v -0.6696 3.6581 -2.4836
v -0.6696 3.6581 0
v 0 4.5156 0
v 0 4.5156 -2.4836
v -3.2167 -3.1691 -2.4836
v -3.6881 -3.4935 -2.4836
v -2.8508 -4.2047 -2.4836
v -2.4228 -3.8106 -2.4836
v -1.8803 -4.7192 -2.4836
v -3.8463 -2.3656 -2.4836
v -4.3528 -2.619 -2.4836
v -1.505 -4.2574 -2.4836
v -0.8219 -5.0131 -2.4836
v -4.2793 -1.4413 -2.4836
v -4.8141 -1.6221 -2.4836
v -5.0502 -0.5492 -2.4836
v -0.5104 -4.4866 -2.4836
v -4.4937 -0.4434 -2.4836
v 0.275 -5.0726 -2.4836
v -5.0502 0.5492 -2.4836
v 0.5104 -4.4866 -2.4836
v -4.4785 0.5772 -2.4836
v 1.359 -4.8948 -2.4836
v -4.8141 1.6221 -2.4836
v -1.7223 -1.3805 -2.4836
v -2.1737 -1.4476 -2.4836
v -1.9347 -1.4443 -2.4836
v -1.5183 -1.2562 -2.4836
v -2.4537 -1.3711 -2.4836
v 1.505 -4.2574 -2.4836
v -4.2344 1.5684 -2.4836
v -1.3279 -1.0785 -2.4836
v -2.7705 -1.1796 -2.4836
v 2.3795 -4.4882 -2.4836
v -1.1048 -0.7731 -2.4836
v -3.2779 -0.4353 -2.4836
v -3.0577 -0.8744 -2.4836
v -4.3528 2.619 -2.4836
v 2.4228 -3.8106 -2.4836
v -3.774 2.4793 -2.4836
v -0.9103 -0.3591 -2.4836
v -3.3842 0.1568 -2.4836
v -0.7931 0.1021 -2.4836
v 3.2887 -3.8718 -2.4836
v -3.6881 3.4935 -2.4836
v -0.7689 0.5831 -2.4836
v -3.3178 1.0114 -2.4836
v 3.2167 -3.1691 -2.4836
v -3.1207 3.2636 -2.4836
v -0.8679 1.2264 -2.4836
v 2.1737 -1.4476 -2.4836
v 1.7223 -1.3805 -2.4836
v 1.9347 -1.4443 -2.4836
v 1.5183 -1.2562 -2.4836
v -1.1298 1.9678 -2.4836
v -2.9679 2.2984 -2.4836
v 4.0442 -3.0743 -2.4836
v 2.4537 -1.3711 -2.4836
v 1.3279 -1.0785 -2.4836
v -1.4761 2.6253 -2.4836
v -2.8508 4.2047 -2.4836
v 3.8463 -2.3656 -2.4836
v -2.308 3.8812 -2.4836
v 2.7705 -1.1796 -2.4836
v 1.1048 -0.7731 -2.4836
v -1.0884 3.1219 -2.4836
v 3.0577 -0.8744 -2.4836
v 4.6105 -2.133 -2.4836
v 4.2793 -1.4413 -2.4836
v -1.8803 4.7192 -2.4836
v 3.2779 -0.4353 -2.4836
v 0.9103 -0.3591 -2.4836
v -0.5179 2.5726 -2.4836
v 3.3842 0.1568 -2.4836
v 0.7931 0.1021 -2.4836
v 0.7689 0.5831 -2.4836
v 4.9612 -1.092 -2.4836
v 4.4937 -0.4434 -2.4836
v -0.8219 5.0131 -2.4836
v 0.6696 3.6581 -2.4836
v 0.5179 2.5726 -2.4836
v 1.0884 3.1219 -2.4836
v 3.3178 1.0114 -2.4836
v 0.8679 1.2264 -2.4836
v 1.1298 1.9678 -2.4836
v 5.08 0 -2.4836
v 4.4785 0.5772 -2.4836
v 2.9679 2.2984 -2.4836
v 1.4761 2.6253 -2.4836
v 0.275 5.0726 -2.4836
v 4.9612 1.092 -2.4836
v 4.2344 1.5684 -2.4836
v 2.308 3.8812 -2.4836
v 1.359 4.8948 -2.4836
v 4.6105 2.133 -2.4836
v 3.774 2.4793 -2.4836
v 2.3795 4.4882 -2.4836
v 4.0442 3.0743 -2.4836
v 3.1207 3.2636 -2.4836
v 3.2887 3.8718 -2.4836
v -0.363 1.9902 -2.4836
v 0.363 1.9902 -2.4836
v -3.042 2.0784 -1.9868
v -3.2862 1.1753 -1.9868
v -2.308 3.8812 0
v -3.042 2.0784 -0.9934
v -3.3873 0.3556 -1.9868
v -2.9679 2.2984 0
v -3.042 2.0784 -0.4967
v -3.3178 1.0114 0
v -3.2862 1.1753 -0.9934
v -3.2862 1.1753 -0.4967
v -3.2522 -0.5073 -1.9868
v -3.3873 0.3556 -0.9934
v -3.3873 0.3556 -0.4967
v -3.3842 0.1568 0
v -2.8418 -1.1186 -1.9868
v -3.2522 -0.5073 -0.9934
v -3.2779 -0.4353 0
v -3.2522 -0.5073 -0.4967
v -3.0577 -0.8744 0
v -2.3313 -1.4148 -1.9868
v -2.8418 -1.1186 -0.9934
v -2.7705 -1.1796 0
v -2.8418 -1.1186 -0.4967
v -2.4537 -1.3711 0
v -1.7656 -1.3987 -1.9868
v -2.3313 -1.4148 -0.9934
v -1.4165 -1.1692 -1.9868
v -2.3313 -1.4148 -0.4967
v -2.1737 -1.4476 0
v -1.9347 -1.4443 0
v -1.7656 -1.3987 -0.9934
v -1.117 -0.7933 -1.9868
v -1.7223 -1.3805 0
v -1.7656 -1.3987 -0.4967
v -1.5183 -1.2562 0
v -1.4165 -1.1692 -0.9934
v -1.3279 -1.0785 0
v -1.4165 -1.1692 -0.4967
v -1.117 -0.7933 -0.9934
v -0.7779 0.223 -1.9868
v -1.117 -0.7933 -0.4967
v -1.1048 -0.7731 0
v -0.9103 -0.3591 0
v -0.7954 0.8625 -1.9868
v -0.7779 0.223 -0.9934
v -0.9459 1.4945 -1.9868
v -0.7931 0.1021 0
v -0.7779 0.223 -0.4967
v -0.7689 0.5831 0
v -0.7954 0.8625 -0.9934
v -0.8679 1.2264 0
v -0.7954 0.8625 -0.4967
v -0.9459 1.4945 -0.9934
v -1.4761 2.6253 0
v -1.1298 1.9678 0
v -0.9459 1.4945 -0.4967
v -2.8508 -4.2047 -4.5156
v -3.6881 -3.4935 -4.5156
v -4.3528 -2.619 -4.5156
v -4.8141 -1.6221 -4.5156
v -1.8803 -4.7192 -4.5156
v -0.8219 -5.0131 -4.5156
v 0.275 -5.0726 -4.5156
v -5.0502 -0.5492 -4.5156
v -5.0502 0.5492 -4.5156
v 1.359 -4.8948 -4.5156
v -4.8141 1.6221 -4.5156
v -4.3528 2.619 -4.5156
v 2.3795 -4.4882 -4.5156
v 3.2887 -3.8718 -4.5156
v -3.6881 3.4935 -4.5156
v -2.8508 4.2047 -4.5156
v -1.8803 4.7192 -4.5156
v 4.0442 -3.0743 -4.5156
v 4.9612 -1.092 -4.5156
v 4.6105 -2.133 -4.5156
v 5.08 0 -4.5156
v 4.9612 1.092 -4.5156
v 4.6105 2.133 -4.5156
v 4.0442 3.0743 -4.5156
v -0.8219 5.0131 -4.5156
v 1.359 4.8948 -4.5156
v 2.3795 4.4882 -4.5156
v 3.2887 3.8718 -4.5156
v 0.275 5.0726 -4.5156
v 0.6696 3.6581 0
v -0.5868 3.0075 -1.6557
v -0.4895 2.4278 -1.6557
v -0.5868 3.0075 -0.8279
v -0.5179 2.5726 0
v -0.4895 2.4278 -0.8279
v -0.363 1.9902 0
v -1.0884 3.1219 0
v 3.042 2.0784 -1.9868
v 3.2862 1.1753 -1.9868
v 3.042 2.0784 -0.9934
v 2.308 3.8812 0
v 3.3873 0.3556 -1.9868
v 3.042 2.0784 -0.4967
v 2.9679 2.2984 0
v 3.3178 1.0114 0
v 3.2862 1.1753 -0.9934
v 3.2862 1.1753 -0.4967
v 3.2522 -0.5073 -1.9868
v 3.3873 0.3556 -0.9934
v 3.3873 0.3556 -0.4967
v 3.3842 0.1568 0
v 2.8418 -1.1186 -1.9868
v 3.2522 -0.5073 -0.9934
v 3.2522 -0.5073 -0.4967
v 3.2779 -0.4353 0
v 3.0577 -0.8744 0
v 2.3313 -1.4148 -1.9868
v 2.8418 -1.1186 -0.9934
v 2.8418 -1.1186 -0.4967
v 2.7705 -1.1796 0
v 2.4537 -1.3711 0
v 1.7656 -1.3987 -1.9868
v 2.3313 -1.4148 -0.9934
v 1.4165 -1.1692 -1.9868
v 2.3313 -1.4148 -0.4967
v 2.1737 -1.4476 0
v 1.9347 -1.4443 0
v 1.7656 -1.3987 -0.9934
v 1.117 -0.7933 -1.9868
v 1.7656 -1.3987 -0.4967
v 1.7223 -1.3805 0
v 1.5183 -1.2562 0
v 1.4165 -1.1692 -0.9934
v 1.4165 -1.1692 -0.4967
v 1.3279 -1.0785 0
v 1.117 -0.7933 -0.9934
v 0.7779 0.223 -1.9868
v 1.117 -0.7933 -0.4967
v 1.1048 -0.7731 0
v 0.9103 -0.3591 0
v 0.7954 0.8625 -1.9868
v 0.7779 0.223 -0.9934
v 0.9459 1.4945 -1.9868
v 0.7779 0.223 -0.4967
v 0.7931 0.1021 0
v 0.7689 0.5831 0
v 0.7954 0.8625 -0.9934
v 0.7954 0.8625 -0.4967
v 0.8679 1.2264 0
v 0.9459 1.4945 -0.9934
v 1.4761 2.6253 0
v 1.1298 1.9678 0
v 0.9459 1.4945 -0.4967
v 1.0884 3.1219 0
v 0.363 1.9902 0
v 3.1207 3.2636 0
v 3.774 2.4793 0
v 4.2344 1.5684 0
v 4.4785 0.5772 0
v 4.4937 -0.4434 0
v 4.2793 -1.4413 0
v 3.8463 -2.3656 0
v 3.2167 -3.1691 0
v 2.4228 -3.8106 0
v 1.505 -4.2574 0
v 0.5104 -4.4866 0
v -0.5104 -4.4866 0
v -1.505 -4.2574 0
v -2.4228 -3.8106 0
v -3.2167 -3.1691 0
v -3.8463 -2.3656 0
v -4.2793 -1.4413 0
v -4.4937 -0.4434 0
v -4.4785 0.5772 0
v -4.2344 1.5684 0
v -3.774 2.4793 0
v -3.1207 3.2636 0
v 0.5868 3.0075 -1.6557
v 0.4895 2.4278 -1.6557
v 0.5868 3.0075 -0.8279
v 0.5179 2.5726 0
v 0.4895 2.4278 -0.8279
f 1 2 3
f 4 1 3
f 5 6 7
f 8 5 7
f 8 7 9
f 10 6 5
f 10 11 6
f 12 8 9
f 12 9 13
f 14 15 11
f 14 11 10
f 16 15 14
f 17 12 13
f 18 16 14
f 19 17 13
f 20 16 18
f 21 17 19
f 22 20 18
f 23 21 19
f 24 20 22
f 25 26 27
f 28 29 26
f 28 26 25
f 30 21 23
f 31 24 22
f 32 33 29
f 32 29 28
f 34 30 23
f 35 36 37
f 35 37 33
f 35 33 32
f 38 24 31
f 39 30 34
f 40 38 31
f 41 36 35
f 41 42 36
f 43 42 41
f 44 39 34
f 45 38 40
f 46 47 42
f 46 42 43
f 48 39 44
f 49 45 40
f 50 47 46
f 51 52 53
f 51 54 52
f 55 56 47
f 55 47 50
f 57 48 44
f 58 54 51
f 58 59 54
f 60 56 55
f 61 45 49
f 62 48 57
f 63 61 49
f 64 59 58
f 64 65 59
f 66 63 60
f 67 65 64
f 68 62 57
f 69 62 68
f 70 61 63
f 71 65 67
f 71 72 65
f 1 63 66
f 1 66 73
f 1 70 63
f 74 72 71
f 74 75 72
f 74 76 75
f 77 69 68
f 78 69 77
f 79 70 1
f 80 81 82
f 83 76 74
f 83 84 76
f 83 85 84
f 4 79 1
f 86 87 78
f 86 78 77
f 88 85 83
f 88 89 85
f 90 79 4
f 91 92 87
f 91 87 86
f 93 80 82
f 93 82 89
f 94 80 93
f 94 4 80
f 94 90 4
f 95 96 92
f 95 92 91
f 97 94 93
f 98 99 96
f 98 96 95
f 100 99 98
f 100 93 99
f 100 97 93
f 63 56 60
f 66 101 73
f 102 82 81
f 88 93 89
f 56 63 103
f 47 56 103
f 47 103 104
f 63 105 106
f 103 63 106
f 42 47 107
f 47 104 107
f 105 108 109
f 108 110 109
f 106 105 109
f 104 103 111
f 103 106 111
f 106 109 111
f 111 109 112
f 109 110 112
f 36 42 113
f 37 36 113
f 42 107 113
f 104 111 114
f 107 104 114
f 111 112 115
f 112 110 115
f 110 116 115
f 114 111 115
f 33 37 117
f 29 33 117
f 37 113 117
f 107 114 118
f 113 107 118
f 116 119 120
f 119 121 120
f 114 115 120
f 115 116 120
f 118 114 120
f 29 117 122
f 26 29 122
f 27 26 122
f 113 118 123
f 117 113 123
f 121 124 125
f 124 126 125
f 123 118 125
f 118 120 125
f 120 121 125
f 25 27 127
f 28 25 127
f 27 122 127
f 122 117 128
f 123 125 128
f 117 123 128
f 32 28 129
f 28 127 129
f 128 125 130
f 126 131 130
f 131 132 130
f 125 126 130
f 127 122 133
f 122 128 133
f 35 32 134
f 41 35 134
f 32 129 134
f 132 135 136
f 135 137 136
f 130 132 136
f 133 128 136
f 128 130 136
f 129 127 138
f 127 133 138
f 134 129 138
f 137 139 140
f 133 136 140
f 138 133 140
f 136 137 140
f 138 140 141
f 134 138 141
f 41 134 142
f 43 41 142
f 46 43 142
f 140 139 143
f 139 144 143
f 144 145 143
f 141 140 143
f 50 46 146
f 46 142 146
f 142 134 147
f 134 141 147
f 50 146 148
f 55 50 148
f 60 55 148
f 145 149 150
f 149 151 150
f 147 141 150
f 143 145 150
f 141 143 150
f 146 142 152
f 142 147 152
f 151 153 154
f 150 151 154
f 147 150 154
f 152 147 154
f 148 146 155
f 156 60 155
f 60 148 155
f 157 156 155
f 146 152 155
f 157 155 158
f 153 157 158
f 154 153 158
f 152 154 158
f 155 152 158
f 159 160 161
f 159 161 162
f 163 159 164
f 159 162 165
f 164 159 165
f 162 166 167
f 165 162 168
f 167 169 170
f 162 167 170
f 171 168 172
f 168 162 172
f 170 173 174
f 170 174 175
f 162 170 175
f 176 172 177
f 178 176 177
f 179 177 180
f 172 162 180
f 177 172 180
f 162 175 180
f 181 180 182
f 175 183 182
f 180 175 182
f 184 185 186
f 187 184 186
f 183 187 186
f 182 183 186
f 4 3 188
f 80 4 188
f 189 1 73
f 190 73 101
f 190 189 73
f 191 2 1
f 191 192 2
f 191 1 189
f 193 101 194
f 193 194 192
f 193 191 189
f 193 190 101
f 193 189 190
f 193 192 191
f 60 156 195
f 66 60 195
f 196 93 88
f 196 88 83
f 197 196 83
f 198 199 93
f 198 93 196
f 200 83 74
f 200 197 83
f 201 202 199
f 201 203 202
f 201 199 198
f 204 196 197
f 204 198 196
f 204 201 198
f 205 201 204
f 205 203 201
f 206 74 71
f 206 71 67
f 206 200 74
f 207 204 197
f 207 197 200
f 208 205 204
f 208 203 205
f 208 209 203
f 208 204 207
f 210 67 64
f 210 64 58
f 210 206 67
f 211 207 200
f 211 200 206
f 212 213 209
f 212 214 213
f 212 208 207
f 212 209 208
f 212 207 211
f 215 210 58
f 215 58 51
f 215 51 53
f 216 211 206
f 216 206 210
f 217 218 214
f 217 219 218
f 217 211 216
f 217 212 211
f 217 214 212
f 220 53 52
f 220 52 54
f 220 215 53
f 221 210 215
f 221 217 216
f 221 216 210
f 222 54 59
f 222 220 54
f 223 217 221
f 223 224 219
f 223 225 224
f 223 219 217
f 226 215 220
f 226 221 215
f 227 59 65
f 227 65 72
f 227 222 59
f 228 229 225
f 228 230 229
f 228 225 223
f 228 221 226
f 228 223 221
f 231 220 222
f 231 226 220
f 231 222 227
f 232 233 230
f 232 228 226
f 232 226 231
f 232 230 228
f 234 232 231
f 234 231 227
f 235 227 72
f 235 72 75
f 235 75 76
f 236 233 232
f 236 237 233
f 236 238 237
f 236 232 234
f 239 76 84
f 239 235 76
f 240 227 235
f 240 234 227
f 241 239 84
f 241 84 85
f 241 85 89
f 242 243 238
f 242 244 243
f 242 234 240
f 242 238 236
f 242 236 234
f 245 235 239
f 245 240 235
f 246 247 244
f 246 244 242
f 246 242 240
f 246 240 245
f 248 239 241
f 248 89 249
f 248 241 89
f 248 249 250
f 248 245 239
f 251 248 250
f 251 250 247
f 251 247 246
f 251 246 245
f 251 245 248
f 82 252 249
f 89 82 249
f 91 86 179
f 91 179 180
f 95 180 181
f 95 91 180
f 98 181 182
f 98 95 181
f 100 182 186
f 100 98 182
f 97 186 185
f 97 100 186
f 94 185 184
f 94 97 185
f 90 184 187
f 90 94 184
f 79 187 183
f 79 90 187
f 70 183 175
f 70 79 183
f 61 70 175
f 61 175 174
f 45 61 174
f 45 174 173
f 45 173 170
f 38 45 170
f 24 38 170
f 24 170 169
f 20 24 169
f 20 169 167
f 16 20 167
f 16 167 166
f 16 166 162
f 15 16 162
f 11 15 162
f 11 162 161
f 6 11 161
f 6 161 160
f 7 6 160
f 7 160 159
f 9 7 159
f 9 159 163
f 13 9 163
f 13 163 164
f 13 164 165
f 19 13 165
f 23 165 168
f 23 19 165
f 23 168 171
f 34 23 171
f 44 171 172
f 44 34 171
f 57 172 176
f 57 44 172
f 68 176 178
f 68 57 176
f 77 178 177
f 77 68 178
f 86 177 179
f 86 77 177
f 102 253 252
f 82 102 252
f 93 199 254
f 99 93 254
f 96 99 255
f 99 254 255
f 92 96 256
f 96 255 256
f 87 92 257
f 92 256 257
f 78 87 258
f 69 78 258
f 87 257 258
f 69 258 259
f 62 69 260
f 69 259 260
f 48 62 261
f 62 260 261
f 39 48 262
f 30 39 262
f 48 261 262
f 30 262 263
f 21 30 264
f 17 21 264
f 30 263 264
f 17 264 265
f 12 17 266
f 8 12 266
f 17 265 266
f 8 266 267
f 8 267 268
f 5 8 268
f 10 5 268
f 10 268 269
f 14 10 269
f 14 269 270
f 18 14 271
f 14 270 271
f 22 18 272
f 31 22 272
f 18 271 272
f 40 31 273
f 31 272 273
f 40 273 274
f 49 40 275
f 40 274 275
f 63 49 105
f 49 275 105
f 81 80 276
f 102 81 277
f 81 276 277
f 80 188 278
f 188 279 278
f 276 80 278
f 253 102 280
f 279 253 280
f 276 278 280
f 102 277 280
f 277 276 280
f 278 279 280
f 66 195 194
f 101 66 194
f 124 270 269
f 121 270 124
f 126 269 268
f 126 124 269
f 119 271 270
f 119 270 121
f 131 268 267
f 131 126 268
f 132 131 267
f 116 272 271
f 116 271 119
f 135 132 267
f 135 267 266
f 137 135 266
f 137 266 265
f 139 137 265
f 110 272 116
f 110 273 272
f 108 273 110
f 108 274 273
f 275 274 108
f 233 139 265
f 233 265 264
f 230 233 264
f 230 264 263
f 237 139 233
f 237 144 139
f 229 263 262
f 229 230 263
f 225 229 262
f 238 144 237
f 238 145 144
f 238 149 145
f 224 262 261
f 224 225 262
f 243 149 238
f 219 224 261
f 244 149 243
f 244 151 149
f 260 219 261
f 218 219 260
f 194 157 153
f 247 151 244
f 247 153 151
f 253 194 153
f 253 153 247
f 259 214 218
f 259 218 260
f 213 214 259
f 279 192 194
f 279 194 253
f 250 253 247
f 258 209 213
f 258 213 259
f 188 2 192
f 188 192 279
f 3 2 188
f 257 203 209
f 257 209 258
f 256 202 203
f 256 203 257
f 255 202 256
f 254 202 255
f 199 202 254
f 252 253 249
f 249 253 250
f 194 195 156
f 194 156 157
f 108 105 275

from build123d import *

# Parameters (mm, degrees)
F1_R     = 28.575
F2_DEPTH = 25.4
F0_R     = 28.575
F3_DEPTH = 13.97
F4_SCALE = 0.1777778


with BuildPart() as f2:
    # F1 (on Top) → F2 (new body)
    with BuildSketch(Plane.XY):
        Circle(F1_R)
    extrude(amount=-F2_DEPTH)

    # F0 (on Top) → F3 (cut)
    with BuildSketch(Plane.XY):
        Circle(F0_R)
        with BuildLine():
            ThreePointArc((0, 25.4), (6.7319690535, 24.491643323), (12.9824397575, 21.8315427293))
            ThreePointArc((12.9824397575, 21.8315427293), (22.0784280446, 12.5579861076), (25.4, 0))
            ThreePointArc((25.4, 0), (-12.5579861076, -22.0784280446), (-12.9824397575, 21.8315427293))
            ThreePointArc((-12.9824397575, 21.8315427293), (-6.7319690535, 24.491643323), (0, 25.4))
        make_face(mode=Mode.SUBTRACT)
        with BuildLine():
            Line((-3.7666436157, 20.576738125), (0, 25.4))
            ThreePointArc((0, 25.4), (-6.7319690535, 24.491643323), (-12.9824397575, 21.8315427293))
            add(Edge.make_bspline(
                [(-12.9824397575, 21.8315427293), (-16.0030685137, 15.555784787), (-20.8706185969, 2.5324190308), (-17.0205320702, -6.8009951083), (-9.0413114467, -9.8024376533), (-2.0221816541, 1.6054390369), (-6.0604248598, 11.0668484831), (-8.3033278917, 14.767423908)],
                knots=[0, 0, 0, 0, 0.267130235, 0.4415507763, 0.5882558694, 0.7799558658, 1, 1, 1, 1], degree=3))
            Line((-8.3033278917, 14.767423908), (-6.1221701965, 17.5604396079))
            Line((-6.1221701965, 17.5604396079), (-2.0420027431, 11.1948987469))
            add(Edge.make_bspline(
                [(-3.7666436157, 20.576738125), (-3.3145767707, 16.8504529935), (-2.8625099256, 13.1241678621), (-2.0420027431, 11.1948987469)],
                knots=[0, 0, 0, 0, 0.6621620022, 0.6621620022, 0.6621620022, 0.6621620022], degree=3))
        make_face()
        with BuildLine():
            Line((6.1221701965, 17.5604396079), (8.3033278917, 14.767423908))
            add(Edge.make_bspline(
                [(12.9824397575, 21.8315427293), (16.0030685137, 15.555784787), (20.8706185969, 2.5324190308), (17.0205320702, -6.8009951083), (9.0413114467, -9.8024376533), (2.0221816541, 1.6054390369), (6.0604248598, 11.0668484831), (8.3033278917, 14.767423908)],
                knots=[0, 0, 0, 0, 0.267130235, 0.4415507763, 0.5882558694, 0.7799558658, 1, 1, 1, 1], degree=3))
            ThreePointArc((12.9824397575, 21.8315427293), (6.7319690535, 24.491643323), (0, 25.4))
            Line((0, 25.4), (3.7666436157, 20.576738125))
            add(Edge.make_bspline(
                [(3.7666436157, 20.576738125), (3.3145767707, 16.8504529935), (2.8625099256, 13.1241678621), (2.0420027431, 11.1948987469)],
                knots=[0, 0, 0, 0, 0.6621620022, 0.6621620022, 0.6621620022, 0.6621620022], degree=3))
            Line((2.0420027431, 11.1948987469), (6.1221701965, 17.5604396079))
        make_face()
    extrude(amount=-F3_DEPTH, mode=Mode.SUBTRACT)


with BuildPart() as f2_1:
    # F4: moved
    add(f2.part.scale(F4_SCALE))


solid = f2_1.part
